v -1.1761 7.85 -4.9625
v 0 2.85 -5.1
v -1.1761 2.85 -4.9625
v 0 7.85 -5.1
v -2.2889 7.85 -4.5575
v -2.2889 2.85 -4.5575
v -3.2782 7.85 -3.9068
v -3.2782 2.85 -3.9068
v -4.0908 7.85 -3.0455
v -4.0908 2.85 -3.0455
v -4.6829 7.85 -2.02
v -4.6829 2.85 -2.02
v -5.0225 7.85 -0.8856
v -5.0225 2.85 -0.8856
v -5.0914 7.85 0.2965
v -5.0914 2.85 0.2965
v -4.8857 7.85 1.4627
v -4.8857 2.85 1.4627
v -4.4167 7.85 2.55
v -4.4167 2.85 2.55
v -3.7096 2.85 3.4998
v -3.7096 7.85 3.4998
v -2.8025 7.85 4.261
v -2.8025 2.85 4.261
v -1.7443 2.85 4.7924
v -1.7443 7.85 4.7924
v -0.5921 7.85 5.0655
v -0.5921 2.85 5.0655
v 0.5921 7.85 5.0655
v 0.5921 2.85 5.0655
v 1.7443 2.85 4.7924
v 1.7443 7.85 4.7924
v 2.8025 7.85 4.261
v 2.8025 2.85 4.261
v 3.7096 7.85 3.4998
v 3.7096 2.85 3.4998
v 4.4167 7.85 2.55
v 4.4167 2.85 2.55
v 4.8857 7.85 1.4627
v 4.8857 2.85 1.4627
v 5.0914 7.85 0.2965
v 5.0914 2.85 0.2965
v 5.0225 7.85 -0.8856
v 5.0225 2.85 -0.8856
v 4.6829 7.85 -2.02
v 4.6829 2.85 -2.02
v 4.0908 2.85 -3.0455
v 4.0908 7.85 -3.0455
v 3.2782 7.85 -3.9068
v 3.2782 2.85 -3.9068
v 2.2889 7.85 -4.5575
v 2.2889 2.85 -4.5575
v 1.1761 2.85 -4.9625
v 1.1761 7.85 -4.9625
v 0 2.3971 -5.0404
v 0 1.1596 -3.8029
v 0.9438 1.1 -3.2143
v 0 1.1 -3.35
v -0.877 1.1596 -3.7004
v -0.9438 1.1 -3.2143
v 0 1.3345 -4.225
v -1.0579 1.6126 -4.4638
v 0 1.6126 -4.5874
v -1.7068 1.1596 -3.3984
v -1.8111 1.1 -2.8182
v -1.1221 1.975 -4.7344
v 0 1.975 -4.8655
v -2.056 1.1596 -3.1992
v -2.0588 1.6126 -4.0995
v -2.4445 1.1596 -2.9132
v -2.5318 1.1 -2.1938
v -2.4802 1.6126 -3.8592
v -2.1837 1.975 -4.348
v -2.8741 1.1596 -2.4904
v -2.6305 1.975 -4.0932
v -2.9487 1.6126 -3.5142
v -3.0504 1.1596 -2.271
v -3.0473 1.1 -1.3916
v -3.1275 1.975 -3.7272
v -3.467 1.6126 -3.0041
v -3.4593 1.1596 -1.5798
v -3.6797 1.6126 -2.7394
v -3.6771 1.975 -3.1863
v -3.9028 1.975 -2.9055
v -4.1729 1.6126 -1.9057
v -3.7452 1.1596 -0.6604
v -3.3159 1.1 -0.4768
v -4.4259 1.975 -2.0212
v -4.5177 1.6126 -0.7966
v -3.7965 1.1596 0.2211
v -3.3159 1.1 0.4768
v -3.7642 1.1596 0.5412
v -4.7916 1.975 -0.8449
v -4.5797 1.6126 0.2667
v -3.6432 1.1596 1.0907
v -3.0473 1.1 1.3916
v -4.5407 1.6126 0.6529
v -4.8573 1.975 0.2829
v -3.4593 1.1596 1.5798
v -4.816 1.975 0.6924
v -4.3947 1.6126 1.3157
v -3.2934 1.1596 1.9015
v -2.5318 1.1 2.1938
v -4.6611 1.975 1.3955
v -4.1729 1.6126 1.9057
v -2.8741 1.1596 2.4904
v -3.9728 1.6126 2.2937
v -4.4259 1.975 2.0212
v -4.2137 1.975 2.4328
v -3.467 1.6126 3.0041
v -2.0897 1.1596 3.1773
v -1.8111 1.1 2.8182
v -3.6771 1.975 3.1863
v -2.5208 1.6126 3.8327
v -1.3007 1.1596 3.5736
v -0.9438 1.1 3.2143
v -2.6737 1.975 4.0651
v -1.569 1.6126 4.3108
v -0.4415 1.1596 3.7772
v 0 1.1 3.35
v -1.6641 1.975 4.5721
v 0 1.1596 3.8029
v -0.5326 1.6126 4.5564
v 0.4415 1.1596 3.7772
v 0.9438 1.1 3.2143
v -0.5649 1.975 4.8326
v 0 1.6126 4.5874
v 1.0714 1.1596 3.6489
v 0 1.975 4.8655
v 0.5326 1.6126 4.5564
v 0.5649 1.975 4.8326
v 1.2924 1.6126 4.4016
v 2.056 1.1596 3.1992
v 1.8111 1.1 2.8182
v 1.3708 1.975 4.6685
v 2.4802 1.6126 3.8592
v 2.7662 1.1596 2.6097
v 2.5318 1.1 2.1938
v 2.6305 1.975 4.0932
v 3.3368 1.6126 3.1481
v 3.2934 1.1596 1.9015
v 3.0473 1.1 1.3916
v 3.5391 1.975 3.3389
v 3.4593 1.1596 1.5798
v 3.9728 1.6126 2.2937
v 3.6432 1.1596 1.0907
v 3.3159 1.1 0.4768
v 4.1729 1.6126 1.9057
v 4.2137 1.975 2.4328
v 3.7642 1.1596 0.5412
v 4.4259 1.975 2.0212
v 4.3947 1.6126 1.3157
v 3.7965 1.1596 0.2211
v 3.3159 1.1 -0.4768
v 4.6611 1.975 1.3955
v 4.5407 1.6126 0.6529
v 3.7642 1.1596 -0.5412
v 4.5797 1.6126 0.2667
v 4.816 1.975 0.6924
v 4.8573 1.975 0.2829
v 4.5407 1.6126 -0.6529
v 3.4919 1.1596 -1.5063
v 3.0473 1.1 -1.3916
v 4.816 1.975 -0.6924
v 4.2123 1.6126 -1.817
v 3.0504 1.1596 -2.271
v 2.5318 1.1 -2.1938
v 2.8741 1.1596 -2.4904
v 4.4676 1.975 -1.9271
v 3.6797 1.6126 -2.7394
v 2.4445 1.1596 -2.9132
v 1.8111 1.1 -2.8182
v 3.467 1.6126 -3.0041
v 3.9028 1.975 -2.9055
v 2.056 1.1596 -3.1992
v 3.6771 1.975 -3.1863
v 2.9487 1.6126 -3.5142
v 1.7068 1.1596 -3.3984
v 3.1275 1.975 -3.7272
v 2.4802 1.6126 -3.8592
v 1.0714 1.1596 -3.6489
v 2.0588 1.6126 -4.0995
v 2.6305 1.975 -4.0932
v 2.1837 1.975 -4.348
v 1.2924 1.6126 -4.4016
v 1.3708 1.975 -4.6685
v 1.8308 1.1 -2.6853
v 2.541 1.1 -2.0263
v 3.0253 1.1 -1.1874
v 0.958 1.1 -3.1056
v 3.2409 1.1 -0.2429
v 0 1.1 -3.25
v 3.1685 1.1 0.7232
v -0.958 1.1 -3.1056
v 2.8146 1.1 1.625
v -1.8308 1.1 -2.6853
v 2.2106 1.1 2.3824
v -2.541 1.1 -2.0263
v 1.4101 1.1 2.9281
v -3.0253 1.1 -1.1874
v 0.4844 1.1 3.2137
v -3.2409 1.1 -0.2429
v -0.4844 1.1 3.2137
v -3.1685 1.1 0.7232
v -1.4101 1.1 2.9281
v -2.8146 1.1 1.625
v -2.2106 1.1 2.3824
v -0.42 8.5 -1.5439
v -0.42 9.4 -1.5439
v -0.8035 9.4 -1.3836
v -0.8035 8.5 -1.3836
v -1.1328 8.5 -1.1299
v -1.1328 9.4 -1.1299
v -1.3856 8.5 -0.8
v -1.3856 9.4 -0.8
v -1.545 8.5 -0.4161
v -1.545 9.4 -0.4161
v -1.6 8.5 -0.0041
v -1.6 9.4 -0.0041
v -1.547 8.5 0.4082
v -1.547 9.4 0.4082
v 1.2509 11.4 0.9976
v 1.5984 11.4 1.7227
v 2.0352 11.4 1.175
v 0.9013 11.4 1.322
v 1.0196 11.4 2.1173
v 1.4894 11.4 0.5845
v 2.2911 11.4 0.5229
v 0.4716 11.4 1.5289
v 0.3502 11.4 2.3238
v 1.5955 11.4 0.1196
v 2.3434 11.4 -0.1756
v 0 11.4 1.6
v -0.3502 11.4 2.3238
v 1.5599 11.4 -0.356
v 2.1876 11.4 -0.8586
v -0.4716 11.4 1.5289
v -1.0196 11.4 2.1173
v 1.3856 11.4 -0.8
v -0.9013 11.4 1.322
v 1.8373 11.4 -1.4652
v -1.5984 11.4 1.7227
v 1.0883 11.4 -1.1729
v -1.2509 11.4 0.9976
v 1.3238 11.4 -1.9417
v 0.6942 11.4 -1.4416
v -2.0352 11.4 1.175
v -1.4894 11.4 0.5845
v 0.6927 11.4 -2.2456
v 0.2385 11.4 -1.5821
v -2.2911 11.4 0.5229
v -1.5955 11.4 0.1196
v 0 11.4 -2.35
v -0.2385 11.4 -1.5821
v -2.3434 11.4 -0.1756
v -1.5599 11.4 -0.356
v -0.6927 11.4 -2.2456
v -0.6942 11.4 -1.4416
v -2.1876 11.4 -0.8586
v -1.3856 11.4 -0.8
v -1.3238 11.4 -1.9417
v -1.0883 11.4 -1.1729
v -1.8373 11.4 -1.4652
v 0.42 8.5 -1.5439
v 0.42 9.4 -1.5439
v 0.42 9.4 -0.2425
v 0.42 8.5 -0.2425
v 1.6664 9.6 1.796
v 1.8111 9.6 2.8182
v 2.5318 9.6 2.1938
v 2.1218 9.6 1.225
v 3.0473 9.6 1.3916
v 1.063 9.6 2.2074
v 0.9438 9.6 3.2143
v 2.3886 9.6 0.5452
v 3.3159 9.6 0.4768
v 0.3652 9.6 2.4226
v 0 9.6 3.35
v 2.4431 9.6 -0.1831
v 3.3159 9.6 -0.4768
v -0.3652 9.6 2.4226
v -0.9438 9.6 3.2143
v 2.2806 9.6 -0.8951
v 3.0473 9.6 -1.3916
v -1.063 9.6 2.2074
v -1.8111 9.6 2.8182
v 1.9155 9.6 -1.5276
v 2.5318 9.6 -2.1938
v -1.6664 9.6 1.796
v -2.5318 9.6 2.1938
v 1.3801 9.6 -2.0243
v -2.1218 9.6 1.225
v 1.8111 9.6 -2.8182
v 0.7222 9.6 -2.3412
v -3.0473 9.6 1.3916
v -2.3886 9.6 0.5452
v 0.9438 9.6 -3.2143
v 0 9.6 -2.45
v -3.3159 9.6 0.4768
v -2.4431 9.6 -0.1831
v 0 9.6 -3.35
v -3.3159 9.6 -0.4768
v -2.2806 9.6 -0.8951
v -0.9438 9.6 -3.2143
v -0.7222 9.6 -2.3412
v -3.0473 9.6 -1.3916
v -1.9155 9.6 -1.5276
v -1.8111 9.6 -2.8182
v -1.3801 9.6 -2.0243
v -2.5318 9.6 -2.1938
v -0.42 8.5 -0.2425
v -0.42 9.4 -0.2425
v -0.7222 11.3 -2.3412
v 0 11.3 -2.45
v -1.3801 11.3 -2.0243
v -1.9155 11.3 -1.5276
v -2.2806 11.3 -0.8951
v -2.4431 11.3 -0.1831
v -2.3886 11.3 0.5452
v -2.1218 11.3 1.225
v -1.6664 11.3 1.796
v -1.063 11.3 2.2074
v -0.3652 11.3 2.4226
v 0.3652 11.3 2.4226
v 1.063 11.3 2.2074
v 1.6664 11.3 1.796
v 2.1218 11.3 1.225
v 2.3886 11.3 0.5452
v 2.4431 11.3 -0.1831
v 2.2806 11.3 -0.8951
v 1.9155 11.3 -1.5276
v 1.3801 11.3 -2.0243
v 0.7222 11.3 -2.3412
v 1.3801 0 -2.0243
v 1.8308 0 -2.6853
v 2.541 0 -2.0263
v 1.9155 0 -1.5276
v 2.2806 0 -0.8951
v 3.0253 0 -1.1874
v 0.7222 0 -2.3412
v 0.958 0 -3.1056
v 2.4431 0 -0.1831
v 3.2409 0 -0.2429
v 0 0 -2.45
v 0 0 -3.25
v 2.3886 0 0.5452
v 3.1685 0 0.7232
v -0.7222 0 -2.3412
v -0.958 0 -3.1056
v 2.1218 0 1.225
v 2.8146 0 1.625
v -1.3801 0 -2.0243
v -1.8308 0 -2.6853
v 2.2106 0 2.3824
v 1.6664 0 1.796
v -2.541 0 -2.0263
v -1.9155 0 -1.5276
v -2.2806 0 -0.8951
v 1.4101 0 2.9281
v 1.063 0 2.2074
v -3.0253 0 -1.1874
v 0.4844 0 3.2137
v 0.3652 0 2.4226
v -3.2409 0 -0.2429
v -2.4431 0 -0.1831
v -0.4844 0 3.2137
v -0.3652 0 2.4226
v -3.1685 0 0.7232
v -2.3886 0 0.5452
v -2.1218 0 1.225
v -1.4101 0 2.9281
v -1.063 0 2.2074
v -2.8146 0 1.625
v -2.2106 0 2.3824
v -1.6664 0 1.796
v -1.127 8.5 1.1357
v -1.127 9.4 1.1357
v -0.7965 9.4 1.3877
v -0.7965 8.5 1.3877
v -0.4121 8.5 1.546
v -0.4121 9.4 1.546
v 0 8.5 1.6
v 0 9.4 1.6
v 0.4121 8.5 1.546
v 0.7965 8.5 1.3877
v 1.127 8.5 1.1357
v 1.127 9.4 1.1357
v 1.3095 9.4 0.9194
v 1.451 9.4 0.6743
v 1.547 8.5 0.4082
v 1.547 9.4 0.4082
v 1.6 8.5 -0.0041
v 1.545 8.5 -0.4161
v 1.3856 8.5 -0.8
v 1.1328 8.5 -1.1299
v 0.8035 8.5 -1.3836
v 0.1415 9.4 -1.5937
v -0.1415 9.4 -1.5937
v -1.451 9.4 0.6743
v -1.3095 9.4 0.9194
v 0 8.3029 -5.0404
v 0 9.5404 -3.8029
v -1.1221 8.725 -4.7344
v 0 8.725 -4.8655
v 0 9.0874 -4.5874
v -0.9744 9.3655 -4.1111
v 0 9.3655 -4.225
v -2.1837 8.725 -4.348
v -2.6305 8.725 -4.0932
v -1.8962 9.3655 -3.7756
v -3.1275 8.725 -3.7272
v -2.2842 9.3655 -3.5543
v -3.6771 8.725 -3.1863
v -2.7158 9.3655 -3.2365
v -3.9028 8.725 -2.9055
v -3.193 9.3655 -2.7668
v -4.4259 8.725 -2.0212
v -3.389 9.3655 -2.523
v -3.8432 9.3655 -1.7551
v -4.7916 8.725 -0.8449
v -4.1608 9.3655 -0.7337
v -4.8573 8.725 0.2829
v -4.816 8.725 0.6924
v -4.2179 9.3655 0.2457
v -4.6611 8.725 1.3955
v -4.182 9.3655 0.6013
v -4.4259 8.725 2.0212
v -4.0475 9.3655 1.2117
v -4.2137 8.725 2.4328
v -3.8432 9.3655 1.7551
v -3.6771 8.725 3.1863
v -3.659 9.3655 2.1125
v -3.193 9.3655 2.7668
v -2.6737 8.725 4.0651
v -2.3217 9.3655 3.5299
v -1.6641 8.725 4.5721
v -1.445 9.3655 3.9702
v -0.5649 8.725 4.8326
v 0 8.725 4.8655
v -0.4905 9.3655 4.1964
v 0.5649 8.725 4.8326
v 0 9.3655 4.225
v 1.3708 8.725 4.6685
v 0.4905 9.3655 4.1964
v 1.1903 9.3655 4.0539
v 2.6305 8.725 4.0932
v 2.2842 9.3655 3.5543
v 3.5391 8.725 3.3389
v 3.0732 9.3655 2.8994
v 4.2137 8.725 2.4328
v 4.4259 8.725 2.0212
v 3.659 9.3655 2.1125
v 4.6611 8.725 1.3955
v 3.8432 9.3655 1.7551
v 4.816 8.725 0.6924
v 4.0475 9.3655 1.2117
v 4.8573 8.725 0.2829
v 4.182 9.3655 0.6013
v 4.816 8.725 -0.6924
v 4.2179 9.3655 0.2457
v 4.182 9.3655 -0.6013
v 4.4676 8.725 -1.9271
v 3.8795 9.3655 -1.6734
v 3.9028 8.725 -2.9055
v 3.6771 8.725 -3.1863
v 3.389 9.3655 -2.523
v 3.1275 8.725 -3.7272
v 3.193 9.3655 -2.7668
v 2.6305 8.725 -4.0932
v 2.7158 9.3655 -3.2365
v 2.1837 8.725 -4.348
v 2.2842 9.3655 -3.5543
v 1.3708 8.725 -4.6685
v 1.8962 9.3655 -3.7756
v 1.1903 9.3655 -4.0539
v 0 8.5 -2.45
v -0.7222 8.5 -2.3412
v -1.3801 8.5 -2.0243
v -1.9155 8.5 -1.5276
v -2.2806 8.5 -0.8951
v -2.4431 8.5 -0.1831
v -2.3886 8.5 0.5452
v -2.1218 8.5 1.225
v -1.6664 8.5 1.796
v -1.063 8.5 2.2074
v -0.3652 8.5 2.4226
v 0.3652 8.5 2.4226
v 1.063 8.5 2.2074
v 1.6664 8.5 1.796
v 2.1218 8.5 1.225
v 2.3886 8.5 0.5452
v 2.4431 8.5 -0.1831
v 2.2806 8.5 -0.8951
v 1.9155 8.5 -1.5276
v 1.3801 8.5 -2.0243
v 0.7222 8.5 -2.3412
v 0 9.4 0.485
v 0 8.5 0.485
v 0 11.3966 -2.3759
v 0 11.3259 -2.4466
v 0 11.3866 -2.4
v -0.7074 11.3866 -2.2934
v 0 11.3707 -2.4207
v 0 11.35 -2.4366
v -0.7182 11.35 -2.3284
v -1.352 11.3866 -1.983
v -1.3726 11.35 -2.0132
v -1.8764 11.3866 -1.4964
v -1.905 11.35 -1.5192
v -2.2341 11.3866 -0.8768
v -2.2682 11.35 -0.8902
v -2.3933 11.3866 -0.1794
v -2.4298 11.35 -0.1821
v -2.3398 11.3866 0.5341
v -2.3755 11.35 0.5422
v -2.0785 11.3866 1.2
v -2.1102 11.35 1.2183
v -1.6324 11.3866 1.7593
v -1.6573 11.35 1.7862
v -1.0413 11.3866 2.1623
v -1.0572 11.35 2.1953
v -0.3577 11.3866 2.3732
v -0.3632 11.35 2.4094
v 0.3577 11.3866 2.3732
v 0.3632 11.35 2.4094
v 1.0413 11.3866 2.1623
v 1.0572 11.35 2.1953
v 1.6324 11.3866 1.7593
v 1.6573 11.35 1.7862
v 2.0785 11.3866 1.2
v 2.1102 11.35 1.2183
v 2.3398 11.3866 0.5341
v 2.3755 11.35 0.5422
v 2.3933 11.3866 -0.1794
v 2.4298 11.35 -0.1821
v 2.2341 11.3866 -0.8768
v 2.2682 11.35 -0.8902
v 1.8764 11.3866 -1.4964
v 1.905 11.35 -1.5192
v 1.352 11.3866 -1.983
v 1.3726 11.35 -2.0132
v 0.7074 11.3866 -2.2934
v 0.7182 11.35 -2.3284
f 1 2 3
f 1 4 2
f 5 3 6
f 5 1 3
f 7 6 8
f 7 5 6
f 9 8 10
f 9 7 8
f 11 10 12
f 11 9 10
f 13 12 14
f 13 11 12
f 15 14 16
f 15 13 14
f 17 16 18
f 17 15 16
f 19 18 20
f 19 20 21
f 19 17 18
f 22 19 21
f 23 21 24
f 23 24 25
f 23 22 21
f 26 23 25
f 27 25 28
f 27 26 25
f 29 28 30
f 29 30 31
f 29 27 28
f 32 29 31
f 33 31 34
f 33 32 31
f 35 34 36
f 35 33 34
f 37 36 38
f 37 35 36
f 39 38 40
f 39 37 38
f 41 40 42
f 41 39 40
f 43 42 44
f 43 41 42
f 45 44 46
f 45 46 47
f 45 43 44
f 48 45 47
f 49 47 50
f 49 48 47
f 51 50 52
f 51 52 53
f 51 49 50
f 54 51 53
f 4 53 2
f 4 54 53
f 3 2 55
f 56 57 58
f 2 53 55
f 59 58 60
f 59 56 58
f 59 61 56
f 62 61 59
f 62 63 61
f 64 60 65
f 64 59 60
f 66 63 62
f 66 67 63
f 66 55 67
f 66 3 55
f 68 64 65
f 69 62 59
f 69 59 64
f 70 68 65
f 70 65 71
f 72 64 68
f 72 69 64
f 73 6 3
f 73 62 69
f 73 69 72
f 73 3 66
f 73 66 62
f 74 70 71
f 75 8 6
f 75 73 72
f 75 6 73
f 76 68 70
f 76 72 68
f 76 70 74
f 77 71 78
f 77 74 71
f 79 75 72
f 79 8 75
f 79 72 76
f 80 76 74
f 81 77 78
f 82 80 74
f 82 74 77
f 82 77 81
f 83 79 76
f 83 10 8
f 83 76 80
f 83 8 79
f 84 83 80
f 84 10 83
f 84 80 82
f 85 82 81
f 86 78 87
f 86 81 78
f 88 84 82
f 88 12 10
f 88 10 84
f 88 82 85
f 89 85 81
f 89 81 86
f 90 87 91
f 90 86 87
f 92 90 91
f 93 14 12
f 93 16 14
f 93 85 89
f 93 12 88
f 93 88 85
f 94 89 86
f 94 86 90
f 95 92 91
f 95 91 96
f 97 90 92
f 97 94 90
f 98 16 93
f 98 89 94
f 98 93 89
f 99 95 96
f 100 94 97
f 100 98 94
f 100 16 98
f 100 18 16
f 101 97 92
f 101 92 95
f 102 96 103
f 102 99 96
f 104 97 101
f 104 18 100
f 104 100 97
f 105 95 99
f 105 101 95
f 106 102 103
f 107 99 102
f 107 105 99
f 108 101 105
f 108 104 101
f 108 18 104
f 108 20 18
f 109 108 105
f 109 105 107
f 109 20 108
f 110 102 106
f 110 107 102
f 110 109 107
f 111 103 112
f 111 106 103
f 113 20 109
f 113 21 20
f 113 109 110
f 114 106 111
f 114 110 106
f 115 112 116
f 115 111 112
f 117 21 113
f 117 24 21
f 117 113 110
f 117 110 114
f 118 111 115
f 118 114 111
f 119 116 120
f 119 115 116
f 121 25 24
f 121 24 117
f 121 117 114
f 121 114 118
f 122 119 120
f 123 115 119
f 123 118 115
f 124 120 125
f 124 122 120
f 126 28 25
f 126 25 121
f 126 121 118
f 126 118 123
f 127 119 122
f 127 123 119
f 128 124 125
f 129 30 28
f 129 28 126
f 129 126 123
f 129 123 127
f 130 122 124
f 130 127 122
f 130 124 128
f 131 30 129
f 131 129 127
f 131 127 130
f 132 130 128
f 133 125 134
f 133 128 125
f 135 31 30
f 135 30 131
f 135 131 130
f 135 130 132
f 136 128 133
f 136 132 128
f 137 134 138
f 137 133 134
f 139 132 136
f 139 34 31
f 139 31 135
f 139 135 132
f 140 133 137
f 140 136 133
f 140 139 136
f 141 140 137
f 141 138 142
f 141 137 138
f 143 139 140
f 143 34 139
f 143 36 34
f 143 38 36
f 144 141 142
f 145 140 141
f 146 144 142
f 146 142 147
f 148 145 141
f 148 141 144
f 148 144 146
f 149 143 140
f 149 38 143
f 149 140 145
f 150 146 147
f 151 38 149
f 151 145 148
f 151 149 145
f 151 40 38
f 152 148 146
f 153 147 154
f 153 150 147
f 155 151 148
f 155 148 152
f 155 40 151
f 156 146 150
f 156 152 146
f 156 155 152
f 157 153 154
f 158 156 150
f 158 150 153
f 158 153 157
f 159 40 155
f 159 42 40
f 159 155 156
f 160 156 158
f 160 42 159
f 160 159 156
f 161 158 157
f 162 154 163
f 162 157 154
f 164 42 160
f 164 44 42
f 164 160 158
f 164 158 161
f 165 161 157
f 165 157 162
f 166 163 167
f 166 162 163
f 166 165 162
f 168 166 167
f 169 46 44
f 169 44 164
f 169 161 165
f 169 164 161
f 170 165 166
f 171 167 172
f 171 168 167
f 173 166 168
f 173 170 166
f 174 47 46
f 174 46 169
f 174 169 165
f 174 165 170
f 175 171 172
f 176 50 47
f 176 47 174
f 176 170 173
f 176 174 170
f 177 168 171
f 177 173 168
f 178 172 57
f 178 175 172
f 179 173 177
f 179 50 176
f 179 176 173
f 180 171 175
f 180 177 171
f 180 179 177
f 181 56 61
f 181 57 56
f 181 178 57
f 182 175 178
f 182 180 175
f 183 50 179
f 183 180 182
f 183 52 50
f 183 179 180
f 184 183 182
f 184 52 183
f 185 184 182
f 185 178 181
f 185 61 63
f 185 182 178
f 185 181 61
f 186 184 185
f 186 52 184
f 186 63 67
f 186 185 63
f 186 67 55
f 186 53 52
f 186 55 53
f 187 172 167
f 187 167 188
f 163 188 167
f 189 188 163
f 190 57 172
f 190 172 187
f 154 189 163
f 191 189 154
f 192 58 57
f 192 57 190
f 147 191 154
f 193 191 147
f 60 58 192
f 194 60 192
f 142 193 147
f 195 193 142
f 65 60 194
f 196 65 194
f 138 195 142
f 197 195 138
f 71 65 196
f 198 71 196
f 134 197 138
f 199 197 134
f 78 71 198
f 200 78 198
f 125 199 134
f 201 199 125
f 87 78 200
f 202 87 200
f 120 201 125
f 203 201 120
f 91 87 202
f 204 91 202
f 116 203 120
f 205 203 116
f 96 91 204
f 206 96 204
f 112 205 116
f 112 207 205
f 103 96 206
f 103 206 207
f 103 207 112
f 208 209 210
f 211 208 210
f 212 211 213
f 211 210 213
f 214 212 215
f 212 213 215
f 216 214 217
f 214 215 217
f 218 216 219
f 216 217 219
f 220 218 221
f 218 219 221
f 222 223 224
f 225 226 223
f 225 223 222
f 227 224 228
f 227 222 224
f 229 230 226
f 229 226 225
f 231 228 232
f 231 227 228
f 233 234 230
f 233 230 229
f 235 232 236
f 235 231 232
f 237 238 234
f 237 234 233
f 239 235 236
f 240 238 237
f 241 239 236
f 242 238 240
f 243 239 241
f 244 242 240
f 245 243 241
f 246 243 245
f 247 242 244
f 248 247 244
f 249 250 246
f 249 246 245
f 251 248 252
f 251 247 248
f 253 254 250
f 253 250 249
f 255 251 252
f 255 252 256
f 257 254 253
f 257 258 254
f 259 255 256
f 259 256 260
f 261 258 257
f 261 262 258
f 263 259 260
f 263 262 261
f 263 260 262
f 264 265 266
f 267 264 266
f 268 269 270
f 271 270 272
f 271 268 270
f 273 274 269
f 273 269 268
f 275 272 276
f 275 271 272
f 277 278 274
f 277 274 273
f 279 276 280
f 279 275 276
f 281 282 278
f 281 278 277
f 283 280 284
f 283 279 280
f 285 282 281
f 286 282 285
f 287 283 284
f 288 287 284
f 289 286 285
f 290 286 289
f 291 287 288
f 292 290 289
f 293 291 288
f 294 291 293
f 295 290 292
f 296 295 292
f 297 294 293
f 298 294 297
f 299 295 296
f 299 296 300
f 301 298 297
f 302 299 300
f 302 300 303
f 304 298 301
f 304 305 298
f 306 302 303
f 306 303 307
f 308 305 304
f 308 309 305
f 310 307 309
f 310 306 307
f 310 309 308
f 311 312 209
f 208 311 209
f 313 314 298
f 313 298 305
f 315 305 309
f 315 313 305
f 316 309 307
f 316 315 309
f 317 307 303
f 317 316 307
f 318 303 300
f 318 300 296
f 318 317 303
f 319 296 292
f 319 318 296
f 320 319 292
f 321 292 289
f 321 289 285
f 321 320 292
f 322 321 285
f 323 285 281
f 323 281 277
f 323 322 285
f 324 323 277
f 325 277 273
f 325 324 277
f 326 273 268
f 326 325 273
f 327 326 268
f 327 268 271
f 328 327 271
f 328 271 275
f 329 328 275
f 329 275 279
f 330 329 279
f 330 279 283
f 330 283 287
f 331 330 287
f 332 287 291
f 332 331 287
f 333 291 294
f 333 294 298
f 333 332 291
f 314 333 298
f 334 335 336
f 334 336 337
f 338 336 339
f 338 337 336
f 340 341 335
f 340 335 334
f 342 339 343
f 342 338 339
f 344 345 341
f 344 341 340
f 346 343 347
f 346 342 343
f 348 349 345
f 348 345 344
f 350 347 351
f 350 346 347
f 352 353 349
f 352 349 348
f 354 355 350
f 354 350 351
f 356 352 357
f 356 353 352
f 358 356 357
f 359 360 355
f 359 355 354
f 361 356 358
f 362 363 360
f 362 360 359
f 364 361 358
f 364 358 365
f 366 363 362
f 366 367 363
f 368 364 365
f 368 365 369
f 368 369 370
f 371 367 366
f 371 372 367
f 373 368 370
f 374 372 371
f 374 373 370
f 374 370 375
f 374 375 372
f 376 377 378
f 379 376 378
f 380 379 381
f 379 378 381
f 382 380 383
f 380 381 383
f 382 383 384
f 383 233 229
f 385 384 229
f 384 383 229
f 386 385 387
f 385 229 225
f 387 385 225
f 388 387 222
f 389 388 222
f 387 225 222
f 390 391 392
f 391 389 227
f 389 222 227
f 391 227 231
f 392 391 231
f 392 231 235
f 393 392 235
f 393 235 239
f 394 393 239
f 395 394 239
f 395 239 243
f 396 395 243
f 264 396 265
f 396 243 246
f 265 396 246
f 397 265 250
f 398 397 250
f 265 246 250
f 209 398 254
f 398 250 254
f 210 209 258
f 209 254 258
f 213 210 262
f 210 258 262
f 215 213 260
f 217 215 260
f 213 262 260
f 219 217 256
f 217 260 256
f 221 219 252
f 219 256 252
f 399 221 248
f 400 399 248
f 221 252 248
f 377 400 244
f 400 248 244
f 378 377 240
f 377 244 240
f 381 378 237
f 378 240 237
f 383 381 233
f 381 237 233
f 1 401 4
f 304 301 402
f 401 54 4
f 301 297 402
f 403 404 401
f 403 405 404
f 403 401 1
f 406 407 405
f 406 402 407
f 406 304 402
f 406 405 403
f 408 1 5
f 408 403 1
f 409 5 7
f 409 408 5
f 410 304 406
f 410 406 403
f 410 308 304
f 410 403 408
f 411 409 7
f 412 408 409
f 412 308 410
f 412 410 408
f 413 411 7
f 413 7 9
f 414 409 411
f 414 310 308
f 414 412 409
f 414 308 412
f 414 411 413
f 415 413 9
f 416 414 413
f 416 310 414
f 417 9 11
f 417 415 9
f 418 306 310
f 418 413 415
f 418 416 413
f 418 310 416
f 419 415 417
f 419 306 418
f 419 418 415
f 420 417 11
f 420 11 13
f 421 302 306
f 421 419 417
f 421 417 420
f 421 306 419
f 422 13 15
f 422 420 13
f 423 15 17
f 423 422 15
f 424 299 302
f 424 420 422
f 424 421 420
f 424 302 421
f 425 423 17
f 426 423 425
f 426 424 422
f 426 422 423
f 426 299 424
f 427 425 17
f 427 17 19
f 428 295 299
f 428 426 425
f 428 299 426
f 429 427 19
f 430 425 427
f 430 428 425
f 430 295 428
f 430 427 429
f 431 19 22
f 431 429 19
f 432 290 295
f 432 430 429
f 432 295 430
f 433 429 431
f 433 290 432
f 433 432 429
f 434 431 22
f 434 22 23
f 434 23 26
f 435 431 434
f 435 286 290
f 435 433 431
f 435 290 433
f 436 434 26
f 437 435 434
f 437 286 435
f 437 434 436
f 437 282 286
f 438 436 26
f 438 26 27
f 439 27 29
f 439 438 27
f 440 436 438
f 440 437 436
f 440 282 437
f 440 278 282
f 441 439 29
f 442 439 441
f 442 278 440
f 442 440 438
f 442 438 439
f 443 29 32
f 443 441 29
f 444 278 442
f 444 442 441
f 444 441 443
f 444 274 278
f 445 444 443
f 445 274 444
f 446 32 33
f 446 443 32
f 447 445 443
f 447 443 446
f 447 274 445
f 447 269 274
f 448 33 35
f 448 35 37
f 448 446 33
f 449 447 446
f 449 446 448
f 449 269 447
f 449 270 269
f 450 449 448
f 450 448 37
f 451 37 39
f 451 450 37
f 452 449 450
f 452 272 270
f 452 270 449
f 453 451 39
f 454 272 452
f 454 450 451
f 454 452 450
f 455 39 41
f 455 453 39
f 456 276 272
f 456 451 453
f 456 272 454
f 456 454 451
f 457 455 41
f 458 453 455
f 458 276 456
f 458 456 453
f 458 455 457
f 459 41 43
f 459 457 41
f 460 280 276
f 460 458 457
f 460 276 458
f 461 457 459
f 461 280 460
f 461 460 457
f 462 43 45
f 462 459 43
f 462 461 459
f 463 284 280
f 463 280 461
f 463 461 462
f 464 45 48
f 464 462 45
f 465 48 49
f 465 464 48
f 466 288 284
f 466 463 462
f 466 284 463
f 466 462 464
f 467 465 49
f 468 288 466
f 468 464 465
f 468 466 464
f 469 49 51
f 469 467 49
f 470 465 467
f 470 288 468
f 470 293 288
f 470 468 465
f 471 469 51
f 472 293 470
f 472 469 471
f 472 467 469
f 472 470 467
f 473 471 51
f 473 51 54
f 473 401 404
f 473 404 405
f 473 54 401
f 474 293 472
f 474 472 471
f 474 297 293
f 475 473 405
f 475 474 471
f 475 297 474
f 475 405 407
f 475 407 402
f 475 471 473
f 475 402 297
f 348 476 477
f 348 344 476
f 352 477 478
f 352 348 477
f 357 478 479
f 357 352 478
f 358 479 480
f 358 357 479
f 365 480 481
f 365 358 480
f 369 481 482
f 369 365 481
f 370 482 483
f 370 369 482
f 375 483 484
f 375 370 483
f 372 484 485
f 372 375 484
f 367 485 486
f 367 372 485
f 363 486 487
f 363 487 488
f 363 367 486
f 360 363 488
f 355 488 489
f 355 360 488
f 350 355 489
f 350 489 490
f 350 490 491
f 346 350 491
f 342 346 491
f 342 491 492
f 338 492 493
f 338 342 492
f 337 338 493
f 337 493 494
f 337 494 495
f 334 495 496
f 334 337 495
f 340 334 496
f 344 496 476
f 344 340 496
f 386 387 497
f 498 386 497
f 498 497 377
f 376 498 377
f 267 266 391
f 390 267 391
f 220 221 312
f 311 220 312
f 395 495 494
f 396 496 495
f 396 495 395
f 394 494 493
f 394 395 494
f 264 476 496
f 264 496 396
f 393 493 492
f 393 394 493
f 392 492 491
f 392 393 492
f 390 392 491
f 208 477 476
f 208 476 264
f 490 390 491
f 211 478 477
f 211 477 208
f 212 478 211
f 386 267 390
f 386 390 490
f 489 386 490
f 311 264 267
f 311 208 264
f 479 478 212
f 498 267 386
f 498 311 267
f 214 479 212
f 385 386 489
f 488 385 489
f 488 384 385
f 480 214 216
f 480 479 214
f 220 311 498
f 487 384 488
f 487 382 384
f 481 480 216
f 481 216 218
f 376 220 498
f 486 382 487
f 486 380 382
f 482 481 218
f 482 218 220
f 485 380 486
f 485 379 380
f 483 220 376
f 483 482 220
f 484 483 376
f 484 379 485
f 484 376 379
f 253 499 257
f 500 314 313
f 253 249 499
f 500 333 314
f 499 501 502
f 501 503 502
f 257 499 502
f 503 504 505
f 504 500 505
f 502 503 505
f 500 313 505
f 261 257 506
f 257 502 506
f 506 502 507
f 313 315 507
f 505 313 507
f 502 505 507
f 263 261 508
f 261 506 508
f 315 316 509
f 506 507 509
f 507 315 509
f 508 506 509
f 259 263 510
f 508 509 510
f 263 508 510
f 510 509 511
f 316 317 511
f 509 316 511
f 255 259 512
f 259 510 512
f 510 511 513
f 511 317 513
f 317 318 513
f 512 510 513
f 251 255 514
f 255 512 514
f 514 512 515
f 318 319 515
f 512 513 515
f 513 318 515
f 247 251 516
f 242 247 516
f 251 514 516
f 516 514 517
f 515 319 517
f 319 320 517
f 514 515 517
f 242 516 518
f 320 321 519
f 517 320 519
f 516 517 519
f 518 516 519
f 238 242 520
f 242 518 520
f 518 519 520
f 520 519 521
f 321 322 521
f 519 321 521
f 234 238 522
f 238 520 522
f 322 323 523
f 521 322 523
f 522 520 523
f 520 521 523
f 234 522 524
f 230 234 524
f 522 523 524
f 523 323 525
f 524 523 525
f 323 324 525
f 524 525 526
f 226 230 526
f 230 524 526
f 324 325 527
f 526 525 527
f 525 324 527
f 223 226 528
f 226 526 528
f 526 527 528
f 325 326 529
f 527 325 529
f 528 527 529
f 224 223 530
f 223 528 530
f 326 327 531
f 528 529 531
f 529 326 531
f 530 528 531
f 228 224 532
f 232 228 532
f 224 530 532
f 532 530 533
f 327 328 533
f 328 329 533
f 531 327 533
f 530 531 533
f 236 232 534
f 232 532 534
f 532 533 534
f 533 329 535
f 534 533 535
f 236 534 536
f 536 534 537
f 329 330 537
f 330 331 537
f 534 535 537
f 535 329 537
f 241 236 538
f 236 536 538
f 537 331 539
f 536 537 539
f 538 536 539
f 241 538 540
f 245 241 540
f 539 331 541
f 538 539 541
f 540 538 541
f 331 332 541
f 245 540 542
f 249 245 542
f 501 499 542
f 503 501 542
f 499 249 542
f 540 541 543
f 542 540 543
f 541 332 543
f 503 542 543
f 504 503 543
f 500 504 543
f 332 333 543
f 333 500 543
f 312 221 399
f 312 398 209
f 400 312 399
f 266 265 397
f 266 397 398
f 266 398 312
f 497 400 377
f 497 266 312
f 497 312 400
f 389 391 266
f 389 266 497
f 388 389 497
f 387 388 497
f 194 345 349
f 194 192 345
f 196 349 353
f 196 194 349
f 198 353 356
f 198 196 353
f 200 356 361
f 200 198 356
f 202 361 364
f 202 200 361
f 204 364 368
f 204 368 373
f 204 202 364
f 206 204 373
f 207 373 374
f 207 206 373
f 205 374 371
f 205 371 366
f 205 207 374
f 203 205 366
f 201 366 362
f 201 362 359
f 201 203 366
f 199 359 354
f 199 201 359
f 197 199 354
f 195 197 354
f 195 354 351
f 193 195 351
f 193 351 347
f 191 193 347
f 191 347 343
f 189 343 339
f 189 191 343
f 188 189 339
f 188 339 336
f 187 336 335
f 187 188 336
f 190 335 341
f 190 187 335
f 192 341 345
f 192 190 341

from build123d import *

# Parameters (mm, degrees)
SKETCH4_R          = 1.6
CUT_EXTRUDE1_DEPTH = 2
CUT_EXTRUDE2_REACH = 15.49
CIRPATTERN1_COUNT  = 3
FILLET1_R          = 0.1


with BuildPart() as part:
    # Sketch2 → Revolve1 (revolve)
    with BuildSketch(Plane(origin=(0, 0, 0), x_dir=(0, 0, -1), z_dir=(1, 0, 0))):
        with BuildLine():
            Line((2.45, 0), (3.25, 0))
            Line((3.25, 0), (3.25, 1.1))
            Line((3.25, 1.1), (3.35, 1.1))
            ThreePointArc((3.35, 1.1), (4.587436867, 1.612563133), (5.1, 2.85))
            Line((5.1, 2.85), (5.1, 7.85))
            ThreePointArc((5.1, 7.85), (4.587436867, 9.087436867), (3.35, 9.6))
            Line((3.35, 9.6), (2.45, 9.6))
            Line((2.45, 9.6), (2.45, 11.4))
            Line((2.45, 11.4), (0, 11.4))
            Line((0, 11.4), (0, 8.5))
            Line((0, 8.5), (2.45, 8.5))
            Line((2.45, 8.5), (2.45, 0))
        make_face()
    revolve(axis=Axis((0, 0, 0), (0, 1, 0)))

    # Sketch4 → Cut-Extrude1 (cut)
    with BuildSketch(Plane(origin=(0, 11.4, 0), x_dir=(1, 0, 0), z_dir=(0, 1, 0))):
        with Locations(Location((0, 0, 0), (0, 0, 270))):
            Circle(SKETCH4_R)
    extrude(amount=-CUT_EXTRUDE1_DEPTH, mode=Mode.SUBTRACT)

    # Sketch5 → Cut-Extrude2 (cut, up to next)
    with BuildSketch(Plane(origin=(0, 11.4, 0), x_dir=(1, 0, 0), z_dir=(0, 1, 0)), mode=Mode.PRIVATE) as cut_extrude2_sk1:
        with BuildLine():
            Line((-1.547048989, -0.408214924), (-0.42, 0.242487113))
            Line((-0.42, 0.242487113), (-0.42, 1.543891188))
            ThreePointArc((-0.42, 1.543891188), (-1.385640646, 0.8), (-1.547048989, -0.408214924))
        make_face()
    cut_extrude2_tool1 = extrude(cut_extrude2_sk1.sketch, amount=-CUT_EXTRUDE2_REACH, mode=Mode.PRIVATE) & part.part
    cut_extrude2 = cut_extrude2_tool1.solids().sort_by_distance((-0.969614, 11.4, -0.559807))[0]
    add(cut_extrude2, mode=Mode.SUBTRACT)

    # CirPattern1: Cut-Extrude2 ×3 about axis
    cirpattern1_axis = Axis((0, 0, 0), (0, 1, 0))
    for i in range(1, CIRPATTERN1_COUNT):
        add(cut_extrude2.rotate(cirpattern1_axis, i * 360 / CIRPATTERN1_COUNT), mode=Mode.SUBTRACT)

    # Fillet1
    fillet1_edges = [part.edges().sort_by_distance(p)[0] for p in [
        (0, 11.4, 2.45),
    ]]
    fillet(fillet1_edges, radius=FILLET1_R)


solid = part.part
